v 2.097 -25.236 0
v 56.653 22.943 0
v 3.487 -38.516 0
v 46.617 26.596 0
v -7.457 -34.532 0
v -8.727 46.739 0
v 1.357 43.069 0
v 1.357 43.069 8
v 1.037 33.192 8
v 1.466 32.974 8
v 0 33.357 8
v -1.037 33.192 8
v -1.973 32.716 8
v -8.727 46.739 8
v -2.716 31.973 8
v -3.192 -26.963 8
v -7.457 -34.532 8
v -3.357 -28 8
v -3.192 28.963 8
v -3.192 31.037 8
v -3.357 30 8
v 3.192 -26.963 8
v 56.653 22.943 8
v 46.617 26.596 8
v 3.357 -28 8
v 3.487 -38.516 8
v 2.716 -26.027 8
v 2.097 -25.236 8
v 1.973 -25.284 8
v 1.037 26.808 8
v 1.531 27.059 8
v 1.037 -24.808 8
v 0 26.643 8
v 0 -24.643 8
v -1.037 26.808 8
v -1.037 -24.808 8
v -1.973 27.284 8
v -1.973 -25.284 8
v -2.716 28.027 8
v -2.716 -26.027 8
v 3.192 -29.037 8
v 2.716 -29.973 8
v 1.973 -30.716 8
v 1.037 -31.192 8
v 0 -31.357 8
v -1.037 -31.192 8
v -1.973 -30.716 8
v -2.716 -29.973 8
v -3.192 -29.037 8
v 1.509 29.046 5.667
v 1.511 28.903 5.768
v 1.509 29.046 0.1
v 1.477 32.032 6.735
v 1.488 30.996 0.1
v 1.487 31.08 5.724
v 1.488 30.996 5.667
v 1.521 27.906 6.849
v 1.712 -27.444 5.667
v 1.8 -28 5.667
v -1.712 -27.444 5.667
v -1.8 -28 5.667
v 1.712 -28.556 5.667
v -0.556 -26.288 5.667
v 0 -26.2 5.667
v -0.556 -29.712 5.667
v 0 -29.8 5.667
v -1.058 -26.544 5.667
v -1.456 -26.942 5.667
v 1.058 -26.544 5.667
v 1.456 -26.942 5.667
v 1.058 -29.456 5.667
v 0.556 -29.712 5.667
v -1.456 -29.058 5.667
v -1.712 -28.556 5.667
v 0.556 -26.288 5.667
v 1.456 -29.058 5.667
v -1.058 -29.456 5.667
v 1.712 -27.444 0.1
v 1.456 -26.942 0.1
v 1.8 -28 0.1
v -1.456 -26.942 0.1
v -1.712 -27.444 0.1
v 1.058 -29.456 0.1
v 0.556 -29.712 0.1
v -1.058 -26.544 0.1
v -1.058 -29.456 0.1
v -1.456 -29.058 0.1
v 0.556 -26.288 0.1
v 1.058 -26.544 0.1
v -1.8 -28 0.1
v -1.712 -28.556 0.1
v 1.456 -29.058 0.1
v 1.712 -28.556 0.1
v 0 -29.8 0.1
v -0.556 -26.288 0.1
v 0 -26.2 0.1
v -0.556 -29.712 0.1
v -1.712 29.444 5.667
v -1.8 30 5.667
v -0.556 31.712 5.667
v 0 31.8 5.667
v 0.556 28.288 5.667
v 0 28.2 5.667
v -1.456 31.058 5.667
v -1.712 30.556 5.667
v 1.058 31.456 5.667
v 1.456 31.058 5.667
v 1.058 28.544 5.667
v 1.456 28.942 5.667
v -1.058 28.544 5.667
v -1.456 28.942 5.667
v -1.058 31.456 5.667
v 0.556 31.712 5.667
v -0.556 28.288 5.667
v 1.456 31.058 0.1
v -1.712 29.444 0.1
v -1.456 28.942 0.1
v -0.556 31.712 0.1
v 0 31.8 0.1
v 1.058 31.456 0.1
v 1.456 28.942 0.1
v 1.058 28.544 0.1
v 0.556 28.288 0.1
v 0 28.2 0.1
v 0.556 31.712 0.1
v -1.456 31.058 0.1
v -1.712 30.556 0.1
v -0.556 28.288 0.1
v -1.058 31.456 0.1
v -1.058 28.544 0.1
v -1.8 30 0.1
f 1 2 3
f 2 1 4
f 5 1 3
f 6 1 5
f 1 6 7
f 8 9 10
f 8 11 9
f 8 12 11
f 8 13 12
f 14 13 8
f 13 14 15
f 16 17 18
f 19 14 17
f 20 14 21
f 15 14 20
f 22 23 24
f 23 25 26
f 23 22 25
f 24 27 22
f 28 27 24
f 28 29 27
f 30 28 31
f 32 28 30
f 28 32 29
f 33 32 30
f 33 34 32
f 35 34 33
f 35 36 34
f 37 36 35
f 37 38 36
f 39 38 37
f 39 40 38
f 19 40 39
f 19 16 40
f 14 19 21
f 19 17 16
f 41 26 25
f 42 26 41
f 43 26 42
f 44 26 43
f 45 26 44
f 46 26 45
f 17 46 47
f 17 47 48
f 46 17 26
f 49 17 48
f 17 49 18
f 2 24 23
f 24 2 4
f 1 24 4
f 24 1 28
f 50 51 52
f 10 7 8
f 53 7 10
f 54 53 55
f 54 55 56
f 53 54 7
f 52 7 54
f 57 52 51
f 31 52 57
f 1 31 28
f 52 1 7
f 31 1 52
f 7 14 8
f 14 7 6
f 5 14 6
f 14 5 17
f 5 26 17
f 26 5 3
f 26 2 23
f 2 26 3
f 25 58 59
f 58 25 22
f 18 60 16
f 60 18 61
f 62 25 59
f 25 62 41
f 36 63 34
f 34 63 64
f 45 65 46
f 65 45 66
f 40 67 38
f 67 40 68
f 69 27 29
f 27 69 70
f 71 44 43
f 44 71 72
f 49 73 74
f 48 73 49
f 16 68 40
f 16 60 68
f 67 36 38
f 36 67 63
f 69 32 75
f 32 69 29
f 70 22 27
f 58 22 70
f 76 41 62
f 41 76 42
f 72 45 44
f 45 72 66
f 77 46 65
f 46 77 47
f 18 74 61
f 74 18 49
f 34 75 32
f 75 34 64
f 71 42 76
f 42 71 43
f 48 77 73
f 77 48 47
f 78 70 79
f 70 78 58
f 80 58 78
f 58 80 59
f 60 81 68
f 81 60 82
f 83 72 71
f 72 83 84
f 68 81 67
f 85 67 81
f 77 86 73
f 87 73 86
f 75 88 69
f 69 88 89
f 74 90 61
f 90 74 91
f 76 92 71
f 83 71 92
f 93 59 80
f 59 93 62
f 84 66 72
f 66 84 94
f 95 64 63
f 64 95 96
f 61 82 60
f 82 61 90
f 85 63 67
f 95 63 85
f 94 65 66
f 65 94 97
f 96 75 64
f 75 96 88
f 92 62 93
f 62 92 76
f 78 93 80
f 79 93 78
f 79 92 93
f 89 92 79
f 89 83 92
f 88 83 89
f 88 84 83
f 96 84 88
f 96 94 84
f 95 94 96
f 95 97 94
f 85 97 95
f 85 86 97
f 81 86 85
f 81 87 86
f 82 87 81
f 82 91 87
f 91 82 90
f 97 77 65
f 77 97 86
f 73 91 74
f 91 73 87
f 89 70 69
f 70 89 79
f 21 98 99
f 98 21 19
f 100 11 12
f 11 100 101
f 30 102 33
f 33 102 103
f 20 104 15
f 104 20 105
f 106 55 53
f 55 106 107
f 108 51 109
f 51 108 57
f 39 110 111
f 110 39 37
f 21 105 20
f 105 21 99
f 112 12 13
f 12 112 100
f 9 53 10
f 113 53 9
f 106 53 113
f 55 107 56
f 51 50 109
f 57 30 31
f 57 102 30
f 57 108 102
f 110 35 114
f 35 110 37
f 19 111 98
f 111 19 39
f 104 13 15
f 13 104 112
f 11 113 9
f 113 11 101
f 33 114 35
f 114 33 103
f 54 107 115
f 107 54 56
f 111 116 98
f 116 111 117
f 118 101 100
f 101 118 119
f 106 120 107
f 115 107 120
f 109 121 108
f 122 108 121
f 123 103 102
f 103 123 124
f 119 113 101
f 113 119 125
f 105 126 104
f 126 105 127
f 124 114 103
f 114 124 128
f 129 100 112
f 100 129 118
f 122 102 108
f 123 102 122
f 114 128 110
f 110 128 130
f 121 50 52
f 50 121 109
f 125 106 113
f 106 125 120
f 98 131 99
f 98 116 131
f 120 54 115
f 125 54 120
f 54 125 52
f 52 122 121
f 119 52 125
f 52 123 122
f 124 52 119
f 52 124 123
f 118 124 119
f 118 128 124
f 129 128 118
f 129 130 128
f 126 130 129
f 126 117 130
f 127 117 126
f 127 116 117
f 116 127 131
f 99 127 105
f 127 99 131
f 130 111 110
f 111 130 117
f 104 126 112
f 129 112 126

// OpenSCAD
// Street Numbers for 3D printing
// Charles Tilford, 2019
// License: CC BY-NC-SA 4.0
//   https://creativecommons.org/licenses/by-nc-sa/4.0/

char="V";     // The number/letter to print

// Units are in mm, except for height of letter

// How many inches high should letter be?
inchesHigh=3;
// How thick/deep should letter be (mm)?
depth=8;

// Character coordinates just center the letter
charX=-25;    // Character X coord
charY=-35;    // Character Y coord
topScrew=30;  // Top screw Y coord
botScrew=-28; // Bottom screw Y coord
height=8;     // Thickness of character
// Screw dimensions. Default presumes
// #6 sheet metal screw
screwWid=3.6; // Width of screw shaft
screwTop=6.78;// Width of screw head
screwCon=5.08;// Height of head 'cone'

// Font to print in. Your system needs this
// installed, of course. If changed the hole
// positions almost certainly need to be
// changed, and maybe charX/charY.
fName="Open Sans Extrabold";
// https://fonts.google.com/specimen/Open+Sans
// Designer: Steve Matteson

// Thin floor below holes. My printer was
// struggling to have the hole 'border' stick
// to the stage. Just drill/screw thru it.
holeFloor=0.1; 

// ==========================================
// ===== All values below are auto-calculated
// ==========================================

// Scaled values
scaleFactor=inchesHigh / 3;
cX=charX * scaleFactor;
cY=charY * scaleFactor;
tS=topScrew * scaleFactor;
bS=botScrew * scaleFactor;
// Where do we start drawing screw head cone?
oS=depth - (screwCon-.05);

difference() {
  // We use difference() to punch out the screw holes
  // in the character
    
  // The character itself, 8mm thick
  rotate(a=-20)
  translate([cX,cY,0])
    linear_extrude(height=depth, scale=1)
    text(char, size=(75*scaleFactor),
         $fn=100, font=fName);
    
  // Bottom screw hole
  translate([0,bS,oS]) color("red")
    cylinder(h=screwCon, d2=screwTop,
             d1=0, $fn=20);
   translate([0,bS,holeFloor])
    cylinder(h=20, d=screwWid, $fn=20);
    
  // Top screw hole
  translate([0,tS,oS]) color("red")
    cylinder(h=screwCon, d2=screwTop,
             d1=0, $fn=20);
  translate([0,tS,holeFloor])
    cylinder(h=20, d=screwWid, $fn=20);
}

// Colors are just to aid visualization of
// void spaces. $fn is "featuer number", ie how
// many polygons are devoted to object. The values
// above should be near your printing limit anyway.

// Developed in OpenSCAD
//    https://www.openscad.org/
